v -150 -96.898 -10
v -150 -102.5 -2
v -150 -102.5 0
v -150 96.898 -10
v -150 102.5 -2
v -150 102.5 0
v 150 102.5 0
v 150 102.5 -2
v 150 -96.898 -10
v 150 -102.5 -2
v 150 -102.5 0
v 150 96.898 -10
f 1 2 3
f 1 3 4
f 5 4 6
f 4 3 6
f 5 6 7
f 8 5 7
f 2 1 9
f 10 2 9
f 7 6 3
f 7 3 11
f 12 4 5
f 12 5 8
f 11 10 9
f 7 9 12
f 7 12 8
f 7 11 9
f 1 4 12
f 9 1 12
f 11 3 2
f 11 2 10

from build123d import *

# Parameters (mm, degrees)
SKETCH_1_W             = 300
SKETCH_1_H             = 205
SM_BASE_FLANGE_1_DEPTH = 10
CHAMFER_1_SIZE         = 8
CHAMFER_1_SIZE2        = 5.601660306
CHAMFER_2_SIZE         = 8
CHAMFER_2_SIZE2        = 5.601660306


# Sheet-metal steps are written as plain solids
with BuildPart() as part:
    # Sketch 1 → 基体-法兰1 (new body)
    with BuildSketch(Plane.XY):
        Rectangle(SKETCH_1_W, SKETCH_1_H)
    extrude(amount=-SM_BASE_FLANGE_1_DEPTH)

    # 倒角1
    chamfer_1_edges = [part.edges().sort_by_distance(p)[0] for p in [
        (0, 102.5, -10),
    ]]
    chamfer_1_side = [part.faces().sort_by_distance(p)[0] for p in [
        (0, 102.5, -5),
    ]]
    chamfer(chamfer_1_edges, length=CHAMFER_1_SIZE, length2=CHAMFER_1_SIZE2, reference=chamfer_1_side[0])

    # 倒角2
    chamfer_2_edges = [part.edges().sort_by_distance(p)[0] for p in [
        (0, -102.5, -10),
    ]]
    chamfer_2_side = [part.faces().sort_by_distance(p)[0] for p in [
        (0, -102.5, -5),
    ]]
    chamfer(chamfer_2_edges, length=CHAMFER_2_SIZE, length2=CHAMFER_2_SIZE2, reference=chamfer_2_side[0])


solid = part.part
